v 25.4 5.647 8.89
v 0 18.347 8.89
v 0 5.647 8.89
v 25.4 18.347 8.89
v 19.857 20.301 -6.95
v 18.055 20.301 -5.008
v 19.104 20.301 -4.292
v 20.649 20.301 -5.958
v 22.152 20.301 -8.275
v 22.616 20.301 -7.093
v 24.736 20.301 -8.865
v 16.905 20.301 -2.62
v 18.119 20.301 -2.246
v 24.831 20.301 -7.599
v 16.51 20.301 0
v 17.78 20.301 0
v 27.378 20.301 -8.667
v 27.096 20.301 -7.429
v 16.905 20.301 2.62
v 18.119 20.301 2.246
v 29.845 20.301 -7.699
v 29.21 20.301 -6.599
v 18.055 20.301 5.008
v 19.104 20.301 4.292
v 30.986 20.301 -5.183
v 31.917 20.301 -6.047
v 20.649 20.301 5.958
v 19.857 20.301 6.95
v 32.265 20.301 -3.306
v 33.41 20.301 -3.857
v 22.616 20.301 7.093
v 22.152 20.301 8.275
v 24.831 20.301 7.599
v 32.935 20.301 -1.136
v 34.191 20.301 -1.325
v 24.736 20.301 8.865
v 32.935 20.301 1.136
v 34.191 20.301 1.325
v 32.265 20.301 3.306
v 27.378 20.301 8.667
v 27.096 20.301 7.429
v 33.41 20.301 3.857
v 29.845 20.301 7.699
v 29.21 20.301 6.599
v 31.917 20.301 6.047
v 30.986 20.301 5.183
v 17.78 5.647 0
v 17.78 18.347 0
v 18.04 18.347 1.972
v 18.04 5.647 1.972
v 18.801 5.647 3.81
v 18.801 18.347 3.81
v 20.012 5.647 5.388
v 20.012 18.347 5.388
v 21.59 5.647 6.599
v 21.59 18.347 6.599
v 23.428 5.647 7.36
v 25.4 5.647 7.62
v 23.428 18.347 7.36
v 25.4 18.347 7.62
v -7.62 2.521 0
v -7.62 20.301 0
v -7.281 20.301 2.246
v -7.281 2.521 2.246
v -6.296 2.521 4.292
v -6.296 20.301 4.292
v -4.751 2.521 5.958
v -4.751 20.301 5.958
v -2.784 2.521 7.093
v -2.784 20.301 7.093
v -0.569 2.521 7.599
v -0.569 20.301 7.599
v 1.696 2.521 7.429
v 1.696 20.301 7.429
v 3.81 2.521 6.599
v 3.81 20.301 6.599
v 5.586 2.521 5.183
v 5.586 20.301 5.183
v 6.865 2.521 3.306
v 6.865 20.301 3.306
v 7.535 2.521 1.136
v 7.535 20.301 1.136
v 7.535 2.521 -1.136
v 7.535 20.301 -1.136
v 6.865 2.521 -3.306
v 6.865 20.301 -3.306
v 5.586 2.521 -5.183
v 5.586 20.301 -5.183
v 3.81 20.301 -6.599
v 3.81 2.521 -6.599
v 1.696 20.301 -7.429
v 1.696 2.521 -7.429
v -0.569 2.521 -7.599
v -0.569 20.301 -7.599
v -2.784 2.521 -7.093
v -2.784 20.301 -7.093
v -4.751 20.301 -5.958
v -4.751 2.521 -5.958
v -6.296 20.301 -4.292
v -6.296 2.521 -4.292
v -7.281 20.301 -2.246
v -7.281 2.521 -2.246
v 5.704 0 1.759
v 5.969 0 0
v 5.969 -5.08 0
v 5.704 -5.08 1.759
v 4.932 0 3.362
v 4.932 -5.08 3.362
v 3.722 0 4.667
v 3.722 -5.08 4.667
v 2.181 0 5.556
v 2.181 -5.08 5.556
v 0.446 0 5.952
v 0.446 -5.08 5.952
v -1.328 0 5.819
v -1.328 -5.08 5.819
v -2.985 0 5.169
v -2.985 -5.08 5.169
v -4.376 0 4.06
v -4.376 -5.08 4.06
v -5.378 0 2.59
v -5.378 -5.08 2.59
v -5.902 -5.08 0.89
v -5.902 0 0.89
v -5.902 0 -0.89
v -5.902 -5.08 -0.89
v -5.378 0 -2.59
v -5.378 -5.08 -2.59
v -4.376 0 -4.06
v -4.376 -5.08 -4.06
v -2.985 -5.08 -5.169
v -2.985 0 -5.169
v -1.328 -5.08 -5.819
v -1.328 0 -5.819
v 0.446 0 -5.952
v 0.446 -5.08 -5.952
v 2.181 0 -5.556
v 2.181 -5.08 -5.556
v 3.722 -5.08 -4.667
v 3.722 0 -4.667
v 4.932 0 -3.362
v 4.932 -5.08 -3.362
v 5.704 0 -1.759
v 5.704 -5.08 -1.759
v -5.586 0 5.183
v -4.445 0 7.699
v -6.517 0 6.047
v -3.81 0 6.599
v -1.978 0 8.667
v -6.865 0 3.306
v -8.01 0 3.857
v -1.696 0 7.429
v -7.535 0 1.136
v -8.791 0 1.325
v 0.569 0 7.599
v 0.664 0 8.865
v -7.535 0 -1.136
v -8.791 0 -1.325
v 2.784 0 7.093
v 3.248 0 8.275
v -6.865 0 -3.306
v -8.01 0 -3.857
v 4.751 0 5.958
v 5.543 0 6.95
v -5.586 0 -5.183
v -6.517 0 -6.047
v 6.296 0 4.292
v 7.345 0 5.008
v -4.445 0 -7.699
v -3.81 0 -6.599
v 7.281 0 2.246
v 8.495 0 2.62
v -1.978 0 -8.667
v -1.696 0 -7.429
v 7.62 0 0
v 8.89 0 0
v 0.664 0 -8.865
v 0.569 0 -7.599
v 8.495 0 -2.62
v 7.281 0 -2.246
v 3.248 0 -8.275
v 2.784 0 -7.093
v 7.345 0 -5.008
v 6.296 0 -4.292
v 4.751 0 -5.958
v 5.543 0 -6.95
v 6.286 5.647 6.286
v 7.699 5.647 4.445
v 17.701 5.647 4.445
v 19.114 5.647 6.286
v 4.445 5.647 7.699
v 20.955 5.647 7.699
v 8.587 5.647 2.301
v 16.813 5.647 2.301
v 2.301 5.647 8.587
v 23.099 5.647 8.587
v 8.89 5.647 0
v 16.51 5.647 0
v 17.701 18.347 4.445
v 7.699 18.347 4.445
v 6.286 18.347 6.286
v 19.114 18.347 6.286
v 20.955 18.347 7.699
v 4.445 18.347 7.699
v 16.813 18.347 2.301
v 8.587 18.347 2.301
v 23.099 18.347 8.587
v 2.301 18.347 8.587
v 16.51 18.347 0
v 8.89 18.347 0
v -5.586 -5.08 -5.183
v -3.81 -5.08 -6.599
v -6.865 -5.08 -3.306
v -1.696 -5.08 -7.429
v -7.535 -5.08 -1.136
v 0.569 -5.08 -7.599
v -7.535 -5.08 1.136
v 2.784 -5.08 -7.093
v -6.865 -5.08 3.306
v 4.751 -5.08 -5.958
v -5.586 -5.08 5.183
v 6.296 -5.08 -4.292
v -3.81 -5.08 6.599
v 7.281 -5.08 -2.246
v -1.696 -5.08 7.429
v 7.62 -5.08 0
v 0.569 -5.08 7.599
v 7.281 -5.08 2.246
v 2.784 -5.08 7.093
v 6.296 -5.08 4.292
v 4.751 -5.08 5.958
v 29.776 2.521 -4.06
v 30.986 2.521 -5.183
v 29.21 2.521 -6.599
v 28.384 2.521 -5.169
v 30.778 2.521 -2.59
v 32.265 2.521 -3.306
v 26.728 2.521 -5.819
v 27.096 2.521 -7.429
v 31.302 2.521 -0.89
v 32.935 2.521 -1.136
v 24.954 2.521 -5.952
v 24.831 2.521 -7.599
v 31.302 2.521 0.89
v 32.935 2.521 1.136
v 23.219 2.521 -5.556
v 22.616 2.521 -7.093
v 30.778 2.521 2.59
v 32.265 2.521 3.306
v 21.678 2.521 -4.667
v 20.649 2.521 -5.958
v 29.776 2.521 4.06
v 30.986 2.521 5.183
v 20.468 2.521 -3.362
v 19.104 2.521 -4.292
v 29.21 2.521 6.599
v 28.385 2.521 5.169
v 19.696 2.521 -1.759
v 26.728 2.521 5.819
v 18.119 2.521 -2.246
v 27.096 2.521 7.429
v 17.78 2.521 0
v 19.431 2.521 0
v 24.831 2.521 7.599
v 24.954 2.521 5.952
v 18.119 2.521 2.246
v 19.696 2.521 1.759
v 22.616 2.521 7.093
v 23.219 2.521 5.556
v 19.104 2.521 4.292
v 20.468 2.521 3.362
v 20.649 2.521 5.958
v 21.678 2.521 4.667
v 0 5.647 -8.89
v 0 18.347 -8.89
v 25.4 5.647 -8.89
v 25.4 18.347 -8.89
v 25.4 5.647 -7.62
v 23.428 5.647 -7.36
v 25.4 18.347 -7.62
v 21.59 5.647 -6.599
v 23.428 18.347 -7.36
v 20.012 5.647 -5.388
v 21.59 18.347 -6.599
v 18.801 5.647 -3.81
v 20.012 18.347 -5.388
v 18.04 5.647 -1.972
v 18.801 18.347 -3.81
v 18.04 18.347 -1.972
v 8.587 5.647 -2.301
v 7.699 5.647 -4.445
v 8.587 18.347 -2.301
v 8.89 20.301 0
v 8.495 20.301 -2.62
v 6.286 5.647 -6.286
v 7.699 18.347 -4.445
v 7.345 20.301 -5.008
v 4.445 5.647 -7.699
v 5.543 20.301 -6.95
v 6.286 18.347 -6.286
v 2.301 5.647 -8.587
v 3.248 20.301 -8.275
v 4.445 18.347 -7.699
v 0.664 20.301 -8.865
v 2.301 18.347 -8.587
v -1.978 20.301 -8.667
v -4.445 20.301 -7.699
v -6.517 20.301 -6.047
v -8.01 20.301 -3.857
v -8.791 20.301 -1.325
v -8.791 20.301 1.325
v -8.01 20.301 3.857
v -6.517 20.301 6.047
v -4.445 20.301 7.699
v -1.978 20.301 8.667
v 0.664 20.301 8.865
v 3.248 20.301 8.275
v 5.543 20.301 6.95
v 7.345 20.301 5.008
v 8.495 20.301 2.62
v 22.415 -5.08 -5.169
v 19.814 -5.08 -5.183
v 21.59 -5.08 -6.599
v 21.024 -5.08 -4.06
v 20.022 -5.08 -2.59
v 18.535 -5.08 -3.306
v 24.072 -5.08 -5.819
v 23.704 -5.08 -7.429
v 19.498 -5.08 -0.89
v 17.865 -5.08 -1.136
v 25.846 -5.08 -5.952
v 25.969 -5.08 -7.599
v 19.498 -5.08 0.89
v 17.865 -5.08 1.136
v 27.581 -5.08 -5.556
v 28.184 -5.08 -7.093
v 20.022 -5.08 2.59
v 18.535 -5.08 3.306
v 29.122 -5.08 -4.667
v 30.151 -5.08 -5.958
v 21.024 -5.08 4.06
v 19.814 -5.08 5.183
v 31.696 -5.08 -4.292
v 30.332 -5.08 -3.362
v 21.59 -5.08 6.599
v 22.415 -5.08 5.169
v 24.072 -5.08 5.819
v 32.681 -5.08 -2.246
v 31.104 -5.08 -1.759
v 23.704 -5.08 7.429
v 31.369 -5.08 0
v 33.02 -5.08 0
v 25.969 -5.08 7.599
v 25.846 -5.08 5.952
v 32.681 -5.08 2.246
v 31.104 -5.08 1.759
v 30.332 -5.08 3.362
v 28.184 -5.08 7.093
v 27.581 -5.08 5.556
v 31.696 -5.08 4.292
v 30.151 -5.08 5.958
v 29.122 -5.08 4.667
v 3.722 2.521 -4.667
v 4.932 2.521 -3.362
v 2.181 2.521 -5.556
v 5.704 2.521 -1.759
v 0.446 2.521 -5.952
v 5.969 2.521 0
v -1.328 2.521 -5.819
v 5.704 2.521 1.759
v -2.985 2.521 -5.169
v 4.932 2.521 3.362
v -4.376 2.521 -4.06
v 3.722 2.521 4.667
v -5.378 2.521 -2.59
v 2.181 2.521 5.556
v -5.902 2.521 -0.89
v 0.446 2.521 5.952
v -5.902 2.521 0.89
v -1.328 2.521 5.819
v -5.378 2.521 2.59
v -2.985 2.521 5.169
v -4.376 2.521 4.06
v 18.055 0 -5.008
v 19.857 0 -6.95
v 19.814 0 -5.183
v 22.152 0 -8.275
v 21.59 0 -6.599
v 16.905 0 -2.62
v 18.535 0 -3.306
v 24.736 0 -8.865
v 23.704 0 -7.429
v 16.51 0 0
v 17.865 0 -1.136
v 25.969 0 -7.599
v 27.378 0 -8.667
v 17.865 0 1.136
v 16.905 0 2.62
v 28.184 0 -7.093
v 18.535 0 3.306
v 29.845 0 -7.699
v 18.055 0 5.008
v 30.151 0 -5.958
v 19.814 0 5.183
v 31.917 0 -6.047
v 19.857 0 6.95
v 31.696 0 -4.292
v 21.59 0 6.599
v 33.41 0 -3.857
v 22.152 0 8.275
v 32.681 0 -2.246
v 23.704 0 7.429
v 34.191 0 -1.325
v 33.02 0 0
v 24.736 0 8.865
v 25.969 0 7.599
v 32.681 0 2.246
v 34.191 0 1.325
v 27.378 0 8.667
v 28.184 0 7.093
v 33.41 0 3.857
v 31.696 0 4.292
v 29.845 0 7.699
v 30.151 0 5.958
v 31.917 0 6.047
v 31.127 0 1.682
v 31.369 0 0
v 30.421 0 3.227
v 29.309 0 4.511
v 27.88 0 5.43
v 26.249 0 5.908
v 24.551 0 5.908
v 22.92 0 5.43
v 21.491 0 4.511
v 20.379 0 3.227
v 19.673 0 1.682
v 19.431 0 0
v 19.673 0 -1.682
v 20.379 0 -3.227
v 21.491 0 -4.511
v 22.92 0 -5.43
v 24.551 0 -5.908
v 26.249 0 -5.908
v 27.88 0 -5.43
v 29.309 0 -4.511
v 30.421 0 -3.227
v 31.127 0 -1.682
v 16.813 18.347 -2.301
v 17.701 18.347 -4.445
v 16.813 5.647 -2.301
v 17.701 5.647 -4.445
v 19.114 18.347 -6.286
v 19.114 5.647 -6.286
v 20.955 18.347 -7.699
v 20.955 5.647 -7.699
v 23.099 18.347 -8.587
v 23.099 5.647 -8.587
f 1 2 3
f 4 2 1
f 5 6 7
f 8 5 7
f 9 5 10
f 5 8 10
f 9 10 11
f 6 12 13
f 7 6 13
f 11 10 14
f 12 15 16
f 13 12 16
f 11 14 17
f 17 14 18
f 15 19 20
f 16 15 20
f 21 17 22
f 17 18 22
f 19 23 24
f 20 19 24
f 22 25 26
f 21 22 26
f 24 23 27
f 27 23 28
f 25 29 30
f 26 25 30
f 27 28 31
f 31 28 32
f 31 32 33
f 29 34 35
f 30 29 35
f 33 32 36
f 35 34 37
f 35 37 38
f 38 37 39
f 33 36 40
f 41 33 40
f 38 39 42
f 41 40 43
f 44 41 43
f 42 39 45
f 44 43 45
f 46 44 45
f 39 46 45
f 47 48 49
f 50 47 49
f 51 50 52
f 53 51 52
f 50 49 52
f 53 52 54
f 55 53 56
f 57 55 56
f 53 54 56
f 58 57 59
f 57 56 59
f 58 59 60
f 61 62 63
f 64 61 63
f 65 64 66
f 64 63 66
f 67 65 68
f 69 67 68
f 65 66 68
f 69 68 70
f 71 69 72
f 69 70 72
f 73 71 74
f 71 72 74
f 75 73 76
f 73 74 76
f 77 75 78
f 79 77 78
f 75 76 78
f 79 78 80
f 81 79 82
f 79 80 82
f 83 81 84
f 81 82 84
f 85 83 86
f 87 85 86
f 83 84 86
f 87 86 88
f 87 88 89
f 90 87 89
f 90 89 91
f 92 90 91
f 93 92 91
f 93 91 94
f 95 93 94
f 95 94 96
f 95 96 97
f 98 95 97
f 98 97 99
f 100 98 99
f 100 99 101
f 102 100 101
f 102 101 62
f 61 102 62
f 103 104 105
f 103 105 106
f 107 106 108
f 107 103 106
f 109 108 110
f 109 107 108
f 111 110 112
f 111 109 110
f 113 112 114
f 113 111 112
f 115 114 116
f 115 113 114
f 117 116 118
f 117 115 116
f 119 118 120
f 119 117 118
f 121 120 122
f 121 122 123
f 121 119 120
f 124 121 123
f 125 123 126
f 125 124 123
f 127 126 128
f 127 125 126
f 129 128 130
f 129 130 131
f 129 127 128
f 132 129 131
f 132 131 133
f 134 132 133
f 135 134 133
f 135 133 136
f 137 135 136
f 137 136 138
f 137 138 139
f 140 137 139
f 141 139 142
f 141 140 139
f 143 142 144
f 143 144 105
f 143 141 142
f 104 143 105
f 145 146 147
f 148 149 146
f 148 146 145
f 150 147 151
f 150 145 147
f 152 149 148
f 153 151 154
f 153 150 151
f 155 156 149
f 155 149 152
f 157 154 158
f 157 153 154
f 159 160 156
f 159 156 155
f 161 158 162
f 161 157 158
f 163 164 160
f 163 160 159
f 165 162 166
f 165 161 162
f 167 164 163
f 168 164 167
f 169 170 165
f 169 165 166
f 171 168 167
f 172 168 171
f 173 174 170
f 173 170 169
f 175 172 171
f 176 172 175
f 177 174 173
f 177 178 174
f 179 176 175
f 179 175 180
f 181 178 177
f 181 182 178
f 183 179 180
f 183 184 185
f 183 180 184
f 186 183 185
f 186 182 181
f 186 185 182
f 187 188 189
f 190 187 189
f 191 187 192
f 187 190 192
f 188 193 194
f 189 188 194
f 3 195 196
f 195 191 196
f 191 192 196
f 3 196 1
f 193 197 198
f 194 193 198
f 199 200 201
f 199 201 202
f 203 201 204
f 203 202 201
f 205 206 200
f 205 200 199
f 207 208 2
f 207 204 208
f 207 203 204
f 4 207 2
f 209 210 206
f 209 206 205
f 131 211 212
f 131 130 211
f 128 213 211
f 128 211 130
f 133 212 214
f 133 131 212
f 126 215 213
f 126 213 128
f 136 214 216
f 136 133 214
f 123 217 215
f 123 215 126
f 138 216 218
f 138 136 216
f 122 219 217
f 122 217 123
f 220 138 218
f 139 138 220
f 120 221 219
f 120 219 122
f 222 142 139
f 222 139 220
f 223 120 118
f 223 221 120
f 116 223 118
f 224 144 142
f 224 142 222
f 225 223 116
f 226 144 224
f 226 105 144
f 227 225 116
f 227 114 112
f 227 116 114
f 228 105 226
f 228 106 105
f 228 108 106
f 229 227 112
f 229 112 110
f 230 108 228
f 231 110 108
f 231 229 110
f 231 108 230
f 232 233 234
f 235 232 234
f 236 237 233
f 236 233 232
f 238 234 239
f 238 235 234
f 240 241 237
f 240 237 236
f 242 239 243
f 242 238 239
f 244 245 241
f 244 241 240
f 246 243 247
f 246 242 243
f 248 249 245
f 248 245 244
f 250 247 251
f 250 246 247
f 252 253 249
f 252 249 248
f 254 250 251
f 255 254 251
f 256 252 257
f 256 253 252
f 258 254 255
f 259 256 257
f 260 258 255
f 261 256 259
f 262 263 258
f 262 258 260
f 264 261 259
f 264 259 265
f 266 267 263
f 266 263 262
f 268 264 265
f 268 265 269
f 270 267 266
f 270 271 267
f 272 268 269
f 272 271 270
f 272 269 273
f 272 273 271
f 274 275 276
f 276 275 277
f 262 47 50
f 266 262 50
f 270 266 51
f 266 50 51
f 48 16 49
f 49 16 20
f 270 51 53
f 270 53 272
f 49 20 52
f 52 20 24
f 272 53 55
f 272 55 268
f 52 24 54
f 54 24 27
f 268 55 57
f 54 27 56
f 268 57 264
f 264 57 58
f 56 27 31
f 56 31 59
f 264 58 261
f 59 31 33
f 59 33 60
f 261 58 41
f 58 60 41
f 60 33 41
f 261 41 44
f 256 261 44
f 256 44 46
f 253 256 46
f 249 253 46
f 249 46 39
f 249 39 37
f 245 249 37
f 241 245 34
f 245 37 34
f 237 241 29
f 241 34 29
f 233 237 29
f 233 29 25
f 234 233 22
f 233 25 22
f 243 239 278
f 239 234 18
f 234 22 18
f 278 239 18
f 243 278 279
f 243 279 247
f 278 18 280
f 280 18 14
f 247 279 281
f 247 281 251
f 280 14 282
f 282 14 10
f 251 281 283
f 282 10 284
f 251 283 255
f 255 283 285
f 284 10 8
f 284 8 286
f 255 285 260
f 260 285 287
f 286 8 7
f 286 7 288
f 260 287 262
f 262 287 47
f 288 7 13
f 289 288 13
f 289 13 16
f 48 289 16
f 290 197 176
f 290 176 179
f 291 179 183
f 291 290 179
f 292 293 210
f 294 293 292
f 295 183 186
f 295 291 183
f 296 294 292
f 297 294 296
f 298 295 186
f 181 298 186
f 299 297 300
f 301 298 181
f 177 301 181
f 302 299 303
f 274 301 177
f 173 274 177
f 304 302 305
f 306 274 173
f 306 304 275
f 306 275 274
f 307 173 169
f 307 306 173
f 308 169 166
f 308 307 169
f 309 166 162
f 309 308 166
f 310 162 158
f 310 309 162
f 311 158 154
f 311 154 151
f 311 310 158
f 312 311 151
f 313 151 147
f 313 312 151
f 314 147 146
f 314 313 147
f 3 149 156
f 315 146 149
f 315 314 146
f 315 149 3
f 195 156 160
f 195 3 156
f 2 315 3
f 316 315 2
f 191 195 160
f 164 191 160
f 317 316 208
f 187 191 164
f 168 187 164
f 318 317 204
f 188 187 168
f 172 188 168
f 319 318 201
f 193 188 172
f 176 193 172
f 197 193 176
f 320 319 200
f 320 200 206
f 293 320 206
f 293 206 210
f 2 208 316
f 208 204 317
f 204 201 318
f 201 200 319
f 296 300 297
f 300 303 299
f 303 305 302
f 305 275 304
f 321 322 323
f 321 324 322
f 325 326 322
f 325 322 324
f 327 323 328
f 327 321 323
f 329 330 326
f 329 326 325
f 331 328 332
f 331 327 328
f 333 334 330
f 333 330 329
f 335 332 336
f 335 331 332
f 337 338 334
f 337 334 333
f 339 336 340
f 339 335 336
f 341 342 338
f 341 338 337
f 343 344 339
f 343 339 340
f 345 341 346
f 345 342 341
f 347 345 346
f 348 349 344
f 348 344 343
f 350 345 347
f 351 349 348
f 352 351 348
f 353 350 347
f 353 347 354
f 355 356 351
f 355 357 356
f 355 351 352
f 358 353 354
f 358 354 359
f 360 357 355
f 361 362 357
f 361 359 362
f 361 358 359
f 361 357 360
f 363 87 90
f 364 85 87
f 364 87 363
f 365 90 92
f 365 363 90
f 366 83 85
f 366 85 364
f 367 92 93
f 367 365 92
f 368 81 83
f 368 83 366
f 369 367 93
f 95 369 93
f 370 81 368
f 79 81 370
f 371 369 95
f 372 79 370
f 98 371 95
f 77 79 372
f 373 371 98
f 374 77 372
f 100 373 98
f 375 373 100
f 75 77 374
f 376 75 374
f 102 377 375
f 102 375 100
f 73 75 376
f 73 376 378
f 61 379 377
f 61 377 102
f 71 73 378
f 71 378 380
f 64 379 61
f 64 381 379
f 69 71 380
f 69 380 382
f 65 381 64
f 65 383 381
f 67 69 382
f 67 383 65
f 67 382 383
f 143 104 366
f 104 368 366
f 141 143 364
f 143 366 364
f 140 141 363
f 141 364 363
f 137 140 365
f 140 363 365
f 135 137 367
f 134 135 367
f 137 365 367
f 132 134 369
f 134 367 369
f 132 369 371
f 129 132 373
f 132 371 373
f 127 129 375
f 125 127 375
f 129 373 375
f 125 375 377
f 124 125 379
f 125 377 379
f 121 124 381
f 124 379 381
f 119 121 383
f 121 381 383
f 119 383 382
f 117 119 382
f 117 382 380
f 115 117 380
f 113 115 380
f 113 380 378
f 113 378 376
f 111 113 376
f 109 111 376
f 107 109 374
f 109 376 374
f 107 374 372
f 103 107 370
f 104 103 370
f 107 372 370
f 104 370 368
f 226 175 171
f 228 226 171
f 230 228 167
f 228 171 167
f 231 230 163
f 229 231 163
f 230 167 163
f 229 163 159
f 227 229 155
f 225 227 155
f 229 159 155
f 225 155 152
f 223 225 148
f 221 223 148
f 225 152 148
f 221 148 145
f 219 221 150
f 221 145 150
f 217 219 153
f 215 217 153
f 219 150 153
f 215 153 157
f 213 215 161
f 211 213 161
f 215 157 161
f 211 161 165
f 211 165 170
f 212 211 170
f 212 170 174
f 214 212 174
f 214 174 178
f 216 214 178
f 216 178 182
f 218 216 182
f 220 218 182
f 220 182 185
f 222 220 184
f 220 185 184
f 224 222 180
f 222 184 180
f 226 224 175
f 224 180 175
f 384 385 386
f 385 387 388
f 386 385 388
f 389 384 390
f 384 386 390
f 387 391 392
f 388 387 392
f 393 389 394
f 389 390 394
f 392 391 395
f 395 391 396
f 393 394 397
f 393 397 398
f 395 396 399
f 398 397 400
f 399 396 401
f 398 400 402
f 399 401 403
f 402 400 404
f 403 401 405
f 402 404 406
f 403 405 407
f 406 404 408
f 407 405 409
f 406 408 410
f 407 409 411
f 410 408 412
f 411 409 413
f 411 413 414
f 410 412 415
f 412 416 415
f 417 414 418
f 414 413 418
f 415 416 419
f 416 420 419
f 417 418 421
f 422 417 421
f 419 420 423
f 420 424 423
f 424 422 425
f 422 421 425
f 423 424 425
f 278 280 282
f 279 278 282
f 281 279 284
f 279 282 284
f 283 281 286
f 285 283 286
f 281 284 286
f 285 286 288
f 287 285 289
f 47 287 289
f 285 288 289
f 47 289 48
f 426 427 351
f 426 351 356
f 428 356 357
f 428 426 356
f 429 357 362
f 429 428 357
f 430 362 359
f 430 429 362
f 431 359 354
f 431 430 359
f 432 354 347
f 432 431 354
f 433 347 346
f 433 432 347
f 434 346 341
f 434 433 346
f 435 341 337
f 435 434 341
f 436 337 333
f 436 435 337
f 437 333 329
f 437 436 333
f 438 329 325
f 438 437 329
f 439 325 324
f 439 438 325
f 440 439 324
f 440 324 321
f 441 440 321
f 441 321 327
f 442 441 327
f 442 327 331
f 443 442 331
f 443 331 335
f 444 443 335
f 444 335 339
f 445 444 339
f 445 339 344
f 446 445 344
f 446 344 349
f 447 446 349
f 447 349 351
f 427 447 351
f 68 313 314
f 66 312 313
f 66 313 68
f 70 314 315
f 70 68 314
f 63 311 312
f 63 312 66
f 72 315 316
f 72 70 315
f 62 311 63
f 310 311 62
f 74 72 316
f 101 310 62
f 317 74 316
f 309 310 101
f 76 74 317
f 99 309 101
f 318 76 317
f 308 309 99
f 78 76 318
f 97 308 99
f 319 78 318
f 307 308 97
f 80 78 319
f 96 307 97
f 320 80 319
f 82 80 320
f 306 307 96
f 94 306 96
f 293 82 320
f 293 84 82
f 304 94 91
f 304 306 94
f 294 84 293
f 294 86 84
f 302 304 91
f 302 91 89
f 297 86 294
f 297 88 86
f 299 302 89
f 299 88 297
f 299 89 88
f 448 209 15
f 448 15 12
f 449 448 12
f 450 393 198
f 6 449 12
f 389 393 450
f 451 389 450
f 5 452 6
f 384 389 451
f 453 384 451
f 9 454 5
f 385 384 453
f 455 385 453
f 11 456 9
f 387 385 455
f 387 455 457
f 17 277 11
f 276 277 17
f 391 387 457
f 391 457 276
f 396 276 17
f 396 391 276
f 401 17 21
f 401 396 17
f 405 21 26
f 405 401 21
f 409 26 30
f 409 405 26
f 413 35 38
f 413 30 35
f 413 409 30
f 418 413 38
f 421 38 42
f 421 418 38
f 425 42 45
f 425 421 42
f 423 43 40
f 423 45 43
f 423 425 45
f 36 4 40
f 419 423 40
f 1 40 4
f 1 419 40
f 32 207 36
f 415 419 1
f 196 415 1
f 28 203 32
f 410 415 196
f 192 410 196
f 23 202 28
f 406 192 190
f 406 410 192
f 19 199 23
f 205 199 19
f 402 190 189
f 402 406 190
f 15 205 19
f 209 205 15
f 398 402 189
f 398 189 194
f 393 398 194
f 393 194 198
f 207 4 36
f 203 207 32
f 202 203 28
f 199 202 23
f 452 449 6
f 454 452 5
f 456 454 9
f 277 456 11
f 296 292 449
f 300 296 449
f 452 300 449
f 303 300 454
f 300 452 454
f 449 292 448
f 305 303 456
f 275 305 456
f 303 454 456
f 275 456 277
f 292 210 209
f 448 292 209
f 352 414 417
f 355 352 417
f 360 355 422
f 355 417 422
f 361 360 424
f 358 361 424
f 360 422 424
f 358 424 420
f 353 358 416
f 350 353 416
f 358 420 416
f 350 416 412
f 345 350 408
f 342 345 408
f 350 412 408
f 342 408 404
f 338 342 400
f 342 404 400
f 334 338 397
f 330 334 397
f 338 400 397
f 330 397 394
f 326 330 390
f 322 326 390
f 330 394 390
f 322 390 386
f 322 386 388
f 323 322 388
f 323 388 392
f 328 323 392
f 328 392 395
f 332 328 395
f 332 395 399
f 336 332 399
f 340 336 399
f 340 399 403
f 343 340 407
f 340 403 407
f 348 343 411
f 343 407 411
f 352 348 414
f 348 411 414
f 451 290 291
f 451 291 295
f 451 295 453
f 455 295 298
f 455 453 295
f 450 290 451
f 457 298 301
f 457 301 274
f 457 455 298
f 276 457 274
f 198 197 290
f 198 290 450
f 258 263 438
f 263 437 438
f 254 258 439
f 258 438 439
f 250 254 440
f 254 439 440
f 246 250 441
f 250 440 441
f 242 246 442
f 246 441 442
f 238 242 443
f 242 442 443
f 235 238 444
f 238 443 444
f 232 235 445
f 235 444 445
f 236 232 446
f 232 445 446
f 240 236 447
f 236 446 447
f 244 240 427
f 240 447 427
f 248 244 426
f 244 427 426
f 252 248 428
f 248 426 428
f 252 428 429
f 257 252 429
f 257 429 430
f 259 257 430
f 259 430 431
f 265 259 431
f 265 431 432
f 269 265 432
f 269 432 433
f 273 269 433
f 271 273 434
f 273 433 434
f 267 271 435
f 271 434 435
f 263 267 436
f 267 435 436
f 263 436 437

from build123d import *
from build123d import SkipClean  # not in build123d's __all__

# Parameters (mm, degrees)
F1_R           = 8.89
F1_R_2         = 5.969
F3_R           = 7.62
F3_R_2         = 5.969
F4_R           = 7.62
F4_R_2         = 5.969
F5_DEPTH       = 5.08
F6_DEPTH       = 25.4
F6_DEPTH_BACK  = 25.4
F7_R           = 7.62
F8_R           = 7.62
F9_DEPTH       = 17.78
F0_W           = 25.4
F0_H           = 12.7
F10_DEPTH      = 8.89
F10_DEPTH_BACK = 8.89
F11_DEPTH      = 17.78


# Not quite as in the source:
# - a feature of the source that left no trace in its solid (it failed there, or was rolled back) is left out


with BuildPart() as f2:
    # F2: sweep along a path in F0
    with BuildLine(Plane.XY) as f2_path:
        Line((0, 0), (0, 35.9156))
        ThreePointArc((0, 35.9156), (12.7, 48.6156), (25.4, 35.9156))
        Line((25.4, 35.9156), (25.4, 0))
    # F1 (on Front) → F2 (sweep)
    with BuildSketch(Plane.XZ):
        Circle(F1_R)
        Circle(F1_R_2, mode=Mode.SUBTRACT)
    sweep(path=f2_path.line)

    # F3 (on face) + F4 (on face) → F5 (join)
    with BuildSketch(Plane.XZ):
        Circle(F3_R)
        Circle(F3_R_2, mode=Mode.SUBTRACT)
    with BuildSketch(Plane.XZ):
        with Locations((25.4, 0)):
            Circle(F4_R)
        with Locations((25.4, 0)):
            Circle(F4_R_2, mode=Mode.SUBTRACT)
    with SkipClean():  # cleaning this boolean's faces spoils the solid; the shape is the same uncleaned
        extrude(amount=F5_DEPTH)

    # F0 (on Top) → F6 (cut, two sides)
    with BuildSketch(Plane.XY) as f6_sk:
        with BuildLine():
            Line((-12.2957220301, 20.301265642), (0, 20.301265642))
            Line((0, 20.301265642), (0, 35.9156))
            ThreePointArc((0, 35.9156), (3.7197438789, 44.8958561211), (12.7, 48.6156))
            ThreePointArc((12.7, 48.6156), (21.6802561211, 44.8958561211), (25.4, 35.9156))
            Line((25.4, 35.9156), (25.4, 20.301265642))
            Line((25.4, 20.301265642), (40.2239970863, 20.301265642))
            Line((40.2239970863, 20.301265642), (40.2239970863, 60.9702691436))
            Line((40.2239970863, 60.9702691436), (-12.2957220301, 60.9702691436))
            Line((-12.2957220301, 60.9702691436), (-12.2957220301, 20.301265642))
        make_face()
        with BuildLine():
            Line((0, 35.9156), (0, 20.301265642))
            Line((0, 20.301265642), (12.7, 20.301265642))
            Line((12.7, 20.301265642), (12.7, 48.6156))
            ThreePointArc((12.7, 48.6156), (3.7197438789, 44.8958561211), (0, 35.9156))
        make_face()
        with BuildLine():
            Line((12.7, 20.301265642), (25.4, 20.301265642))
            Line((25.4, 20.301265642), (25.4, 35.9156))
            ThreePointArc((25.4, 35.9156), (21.6802561211, 44.8958561211), (12.7, 48.6156))
            Line((12.7, 48.6156), (12.7, 20.301265642))
        make_face()
    extrude(amount=-F6_DEPTH, mode=Mode.SUBTRACT)
    extrude(f6_sk.sketch, amount=F6_DEPTH_BACK, mode=Mode.SUBTRACT)

    # F7 (on face) + F8 (on face) → F9 (cut)
    with BuildSketch(Plane(origin=(0, 20.301265642, 0), x_dir=(-1, 0, 0), z_dir=(0, 1, 0))):
        with Locations((-25.4, 0)):
            Circle(F7_R)
    with BuildSketch(Plane(origin=(0, 20.301265642, 0), x_dir=(-1, 0, 0), z_dir=(0, 1, 0))):
        Circle(F8_R)
    extrude(amount=-F9_DEPTH, mode=Mode.SUBTRACT)

    # F0 (on Top) → F10 (join, two sides)
    with BuildSketch(Plane.XY) as f10_sk:
        with Locations((12.7, 11.9974283338)):
            Rectangle(F0_W, F0_H)
    extrude(amount=F10_DEPTH)
    extrude(f10_sk.sketch, amount=-F10_DEPTH_BACK)

    # F7 (on face) + F8 (on face) → F11 (cut)
    with BuildSketch(Plane(origin=(0, 20.301265642, 0), x_dir=(-1, 0, 0), z_dir=(0, 1, 0))):
        with Locations((-25.4, 0)):
            Circle(F7_R)
    with BuildSketch(Plane(origin=(0, 20.301265642, 0), x_dir=(-1, 0, 0), z_dir=(0, 1, 0))):
        Circle(F8_R)
    extrude(amount=-F11_DEPTH, mode=Mode.SUBTRACT)


solid = f2.part
